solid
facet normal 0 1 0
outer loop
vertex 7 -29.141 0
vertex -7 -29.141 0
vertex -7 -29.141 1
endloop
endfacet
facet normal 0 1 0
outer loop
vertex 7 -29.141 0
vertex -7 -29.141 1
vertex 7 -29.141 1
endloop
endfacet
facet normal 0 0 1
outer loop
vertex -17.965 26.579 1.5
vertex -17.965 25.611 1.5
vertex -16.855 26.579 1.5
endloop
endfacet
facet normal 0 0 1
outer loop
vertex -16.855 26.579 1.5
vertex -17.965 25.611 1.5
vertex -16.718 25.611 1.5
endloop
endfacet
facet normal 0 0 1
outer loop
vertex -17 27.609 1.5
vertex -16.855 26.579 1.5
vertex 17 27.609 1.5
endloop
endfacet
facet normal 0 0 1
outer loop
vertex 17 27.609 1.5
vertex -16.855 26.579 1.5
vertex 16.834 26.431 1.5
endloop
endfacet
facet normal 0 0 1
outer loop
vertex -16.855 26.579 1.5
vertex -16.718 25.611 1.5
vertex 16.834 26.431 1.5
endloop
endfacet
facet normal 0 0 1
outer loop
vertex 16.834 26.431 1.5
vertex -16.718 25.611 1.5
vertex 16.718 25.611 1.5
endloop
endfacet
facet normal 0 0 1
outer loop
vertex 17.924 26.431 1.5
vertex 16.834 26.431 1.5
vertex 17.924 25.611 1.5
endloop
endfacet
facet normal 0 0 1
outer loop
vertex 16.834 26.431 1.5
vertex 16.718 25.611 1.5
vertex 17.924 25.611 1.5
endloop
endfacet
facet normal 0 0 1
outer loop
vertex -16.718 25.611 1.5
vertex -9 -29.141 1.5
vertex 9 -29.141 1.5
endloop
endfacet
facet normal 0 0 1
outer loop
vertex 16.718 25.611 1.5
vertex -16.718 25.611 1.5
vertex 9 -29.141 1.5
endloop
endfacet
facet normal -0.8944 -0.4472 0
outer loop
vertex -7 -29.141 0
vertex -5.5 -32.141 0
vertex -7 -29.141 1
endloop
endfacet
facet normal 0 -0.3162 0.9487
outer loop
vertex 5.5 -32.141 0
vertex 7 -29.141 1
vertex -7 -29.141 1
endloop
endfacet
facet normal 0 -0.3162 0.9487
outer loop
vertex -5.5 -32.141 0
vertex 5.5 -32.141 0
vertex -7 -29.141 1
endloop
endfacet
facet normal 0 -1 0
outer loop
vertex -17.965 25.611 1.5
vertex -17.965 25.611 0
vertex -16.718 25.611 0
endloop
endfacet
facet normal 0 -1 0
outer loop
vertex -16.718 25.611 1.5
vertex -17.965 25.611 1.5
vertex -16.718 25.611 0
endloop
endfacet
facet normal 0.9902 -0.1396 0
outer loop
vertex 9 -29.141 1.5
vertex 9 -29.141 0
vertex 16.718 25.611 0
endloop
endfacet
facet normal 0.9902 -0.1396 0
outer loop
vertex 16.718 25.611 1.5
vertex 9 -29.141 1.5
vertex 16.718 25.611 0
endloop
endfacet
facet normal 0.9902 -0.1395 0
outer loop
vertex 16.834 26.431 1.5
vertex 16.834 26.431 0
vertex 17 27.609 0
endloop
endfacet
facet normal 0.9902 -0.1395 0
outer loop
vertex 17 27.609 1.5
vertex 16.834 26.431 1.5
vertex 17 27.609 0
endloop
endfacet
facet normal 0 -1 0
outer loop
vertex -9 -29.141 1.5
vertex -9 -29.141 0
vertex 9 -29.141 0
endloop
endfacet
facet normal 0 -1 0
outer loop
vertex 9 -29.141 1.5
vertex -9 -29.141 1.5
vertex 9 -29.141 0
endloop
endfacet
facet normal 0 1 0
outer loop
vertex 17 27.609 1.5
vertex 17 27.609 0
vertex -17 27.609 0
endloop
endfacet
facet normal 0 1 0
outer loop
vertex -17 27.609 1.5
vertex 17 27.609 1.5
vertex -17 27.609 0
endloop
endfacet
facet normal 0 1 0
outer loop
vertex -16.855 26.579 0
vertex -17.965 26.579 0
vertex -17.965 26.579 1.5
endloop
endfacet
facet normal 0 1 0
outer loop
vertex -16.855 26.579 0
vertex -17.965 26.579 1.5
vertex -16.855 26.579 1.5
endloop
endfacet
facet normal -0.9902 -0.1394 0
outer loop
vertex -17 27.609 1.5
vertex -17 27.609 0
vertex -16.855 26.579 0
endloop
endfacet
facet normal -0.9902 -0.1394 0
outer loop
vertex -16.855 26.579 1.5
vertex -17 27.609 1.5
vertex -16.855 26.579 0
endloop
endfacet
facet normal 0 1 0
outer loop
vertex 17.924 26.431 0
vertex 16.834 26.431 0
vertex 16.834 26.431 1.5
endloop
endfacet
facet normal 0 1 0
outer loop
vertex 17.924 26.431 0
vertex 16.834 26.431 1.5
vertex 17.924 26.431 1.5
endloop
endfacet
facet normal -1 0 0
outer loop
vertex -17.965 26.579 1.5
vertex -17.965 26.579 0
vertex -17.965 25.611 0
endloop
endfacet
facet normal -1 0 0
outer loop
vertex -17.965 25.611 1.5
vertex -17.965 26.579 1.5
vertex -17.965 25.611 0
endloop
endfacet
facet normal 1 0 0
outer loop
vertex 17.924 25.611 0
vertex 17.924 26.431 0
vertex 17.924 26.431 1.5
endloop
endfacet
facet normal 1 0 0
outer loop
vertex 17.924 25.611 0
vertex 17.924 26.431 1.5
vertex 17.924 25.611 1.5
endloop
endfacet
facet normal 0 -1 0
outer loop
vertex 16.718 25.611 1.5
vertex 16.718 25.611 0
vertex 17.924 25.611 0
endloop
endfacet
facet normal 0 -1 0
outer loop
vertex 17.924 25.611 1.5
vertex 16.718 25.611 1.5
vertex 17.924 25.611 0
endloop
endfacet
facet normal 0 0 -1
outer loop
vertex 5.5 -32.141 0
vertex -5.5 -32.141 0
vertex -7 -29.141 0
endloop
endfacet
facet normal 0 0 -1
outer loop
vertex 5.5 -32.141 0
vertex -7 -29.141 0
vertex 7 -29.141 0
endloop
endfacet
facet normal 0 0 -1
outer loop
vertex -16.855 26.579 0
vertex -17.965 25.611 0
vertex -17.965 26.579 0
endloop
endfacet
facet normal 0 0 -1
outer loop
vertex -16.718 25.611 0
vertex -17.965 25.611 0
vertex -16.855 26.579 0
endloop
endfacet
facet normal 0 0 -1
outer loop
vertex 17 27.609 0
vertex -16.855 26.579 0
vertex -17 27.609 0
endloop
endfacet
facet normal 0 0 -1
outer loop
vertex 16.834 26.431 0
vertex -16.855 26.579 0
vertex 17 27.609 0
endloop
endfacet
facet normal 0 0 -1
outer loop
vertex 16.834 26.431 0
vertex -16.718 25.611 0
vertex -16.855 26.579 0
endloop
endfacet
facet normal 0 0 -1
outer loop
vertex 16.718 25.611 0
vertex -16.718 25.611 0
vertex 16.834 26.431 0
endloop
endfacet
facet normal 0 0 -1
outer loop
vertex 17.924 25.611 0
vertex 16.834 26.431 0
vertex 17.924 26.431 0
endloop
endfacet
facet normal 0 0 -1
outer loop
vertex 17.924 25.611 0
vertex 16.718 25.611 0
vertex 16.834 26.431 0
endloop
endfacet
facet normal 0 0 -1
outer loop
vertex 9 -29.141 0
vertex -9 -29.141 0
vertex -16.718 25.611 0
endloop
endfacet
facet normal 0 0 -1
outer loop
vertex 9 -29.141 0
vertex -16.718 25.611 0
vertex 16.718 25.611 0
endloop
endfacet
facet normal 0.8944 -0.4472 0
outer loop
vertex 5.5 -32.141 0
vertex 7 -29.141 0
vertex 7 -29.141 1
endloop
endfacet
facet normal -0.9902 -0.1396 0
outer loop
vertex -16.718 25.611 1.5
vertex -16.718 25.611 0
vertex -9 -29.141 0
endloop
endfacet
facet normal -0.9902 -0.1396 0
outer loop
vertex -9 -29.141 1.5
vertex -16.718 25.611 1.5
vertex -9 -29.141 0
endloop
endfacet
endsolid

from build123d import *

# Parameters (mm, degrees)
F1_DEPTH = 1.5
F3_DEPTH = 1
F4_SIZE2 = 2.99999
F4_SIZE  = 0.99999
F5_W     = 2.5577563792
F5_H     = 0.9680986404
F5_W_2   = 3.2131588086
F5_H_2   = 0.8198879659
F6_DEPTH = 1.5
F7_DEPTH = 1.5


# Not quite as in the source:
# - a fillet or chamfer is up to 0.001 mm smaller than in the source, because OpenCascade refuses the exact size


with BuildPart() as f1:
    # F0 (on Top) → F1 (new body)
    with BuildSketch(Plane.XY):
        Polygon((17, 27.609485096), (0, 27.609485096), (0, -29.140514904), (7, -29.140514904), (9, -29.140514904), align=None)
        Polygon((0, -29.140514904), (0, 27.609485096), (-17, 27.609485096), (-9, -29.140514904), (-7, -29.140514904), align=None)
    extrude(amount=F1_DEPTH)

    # F5 (on face) → F6 (join)
    with BuildSketch(Plane(origin=(0, 0, 0), x_dir=(1, 0, 0), z_dir=(0, 0, -1))):
        with Locations((-16.6856339201, -26.0949004441)):
            Rectangle(F5_W, F5_H)
        with Locations((16.3177815266, -26.0207951069)):
            Rectangle(F5_W_2, F5_H_2)
    extrude(amount=-F6_DEPTH)

    # F5 (on face) → F7 (join)
    with BuildSketch(Plane(origin=(0, 0, 0), x_dir=(1, 0, 0), z_dir=(0, 0, -1))):
        with Locations((-16.6856339201, -26.0949004441)):
            Rectangle(F5_W, F5_H)
        with Locations((16.3177815266, -26.0207951069)):
            Rectangle(F5_W_2, F5_H_2)
    extrude(amount=-F7_DEPTH)


with BuildPart() as f3:
    # F2 (on face) → F3 (new body)
    with BuildSketch(Plane(origin=(0, 0, 0), x_dir=(1, 0, 0), z_dir=(0, 0, -1))):
        Polygon((-5.5, 29.140514904), (0, 29.140514904), (5.5, 29.140514904), (7, 29.140514904), (5.5, 32.140514904), (0, 32.140514904), (-5.5, 32.140514904), align=None)
        Polygon((-7, 29.140514904), (-5.5, 29.140514904), (-5.5, 32.140514904), align=None)
    extrude(amount=-F3_DEPTH)

    # F4 (size 1 and 3 in the source; OpenCascade refuses exactly that, so slightly less here)
    f4_edges = [f3.edges().sort_by_distance(p)[0] for p in [
        (0, -32.140515, 1),
    ]]
    chamfer(f4_edges, length=F4_SIZE, length2=F4_SIZE2)


solid = Compound([f1.part, f3.part])
